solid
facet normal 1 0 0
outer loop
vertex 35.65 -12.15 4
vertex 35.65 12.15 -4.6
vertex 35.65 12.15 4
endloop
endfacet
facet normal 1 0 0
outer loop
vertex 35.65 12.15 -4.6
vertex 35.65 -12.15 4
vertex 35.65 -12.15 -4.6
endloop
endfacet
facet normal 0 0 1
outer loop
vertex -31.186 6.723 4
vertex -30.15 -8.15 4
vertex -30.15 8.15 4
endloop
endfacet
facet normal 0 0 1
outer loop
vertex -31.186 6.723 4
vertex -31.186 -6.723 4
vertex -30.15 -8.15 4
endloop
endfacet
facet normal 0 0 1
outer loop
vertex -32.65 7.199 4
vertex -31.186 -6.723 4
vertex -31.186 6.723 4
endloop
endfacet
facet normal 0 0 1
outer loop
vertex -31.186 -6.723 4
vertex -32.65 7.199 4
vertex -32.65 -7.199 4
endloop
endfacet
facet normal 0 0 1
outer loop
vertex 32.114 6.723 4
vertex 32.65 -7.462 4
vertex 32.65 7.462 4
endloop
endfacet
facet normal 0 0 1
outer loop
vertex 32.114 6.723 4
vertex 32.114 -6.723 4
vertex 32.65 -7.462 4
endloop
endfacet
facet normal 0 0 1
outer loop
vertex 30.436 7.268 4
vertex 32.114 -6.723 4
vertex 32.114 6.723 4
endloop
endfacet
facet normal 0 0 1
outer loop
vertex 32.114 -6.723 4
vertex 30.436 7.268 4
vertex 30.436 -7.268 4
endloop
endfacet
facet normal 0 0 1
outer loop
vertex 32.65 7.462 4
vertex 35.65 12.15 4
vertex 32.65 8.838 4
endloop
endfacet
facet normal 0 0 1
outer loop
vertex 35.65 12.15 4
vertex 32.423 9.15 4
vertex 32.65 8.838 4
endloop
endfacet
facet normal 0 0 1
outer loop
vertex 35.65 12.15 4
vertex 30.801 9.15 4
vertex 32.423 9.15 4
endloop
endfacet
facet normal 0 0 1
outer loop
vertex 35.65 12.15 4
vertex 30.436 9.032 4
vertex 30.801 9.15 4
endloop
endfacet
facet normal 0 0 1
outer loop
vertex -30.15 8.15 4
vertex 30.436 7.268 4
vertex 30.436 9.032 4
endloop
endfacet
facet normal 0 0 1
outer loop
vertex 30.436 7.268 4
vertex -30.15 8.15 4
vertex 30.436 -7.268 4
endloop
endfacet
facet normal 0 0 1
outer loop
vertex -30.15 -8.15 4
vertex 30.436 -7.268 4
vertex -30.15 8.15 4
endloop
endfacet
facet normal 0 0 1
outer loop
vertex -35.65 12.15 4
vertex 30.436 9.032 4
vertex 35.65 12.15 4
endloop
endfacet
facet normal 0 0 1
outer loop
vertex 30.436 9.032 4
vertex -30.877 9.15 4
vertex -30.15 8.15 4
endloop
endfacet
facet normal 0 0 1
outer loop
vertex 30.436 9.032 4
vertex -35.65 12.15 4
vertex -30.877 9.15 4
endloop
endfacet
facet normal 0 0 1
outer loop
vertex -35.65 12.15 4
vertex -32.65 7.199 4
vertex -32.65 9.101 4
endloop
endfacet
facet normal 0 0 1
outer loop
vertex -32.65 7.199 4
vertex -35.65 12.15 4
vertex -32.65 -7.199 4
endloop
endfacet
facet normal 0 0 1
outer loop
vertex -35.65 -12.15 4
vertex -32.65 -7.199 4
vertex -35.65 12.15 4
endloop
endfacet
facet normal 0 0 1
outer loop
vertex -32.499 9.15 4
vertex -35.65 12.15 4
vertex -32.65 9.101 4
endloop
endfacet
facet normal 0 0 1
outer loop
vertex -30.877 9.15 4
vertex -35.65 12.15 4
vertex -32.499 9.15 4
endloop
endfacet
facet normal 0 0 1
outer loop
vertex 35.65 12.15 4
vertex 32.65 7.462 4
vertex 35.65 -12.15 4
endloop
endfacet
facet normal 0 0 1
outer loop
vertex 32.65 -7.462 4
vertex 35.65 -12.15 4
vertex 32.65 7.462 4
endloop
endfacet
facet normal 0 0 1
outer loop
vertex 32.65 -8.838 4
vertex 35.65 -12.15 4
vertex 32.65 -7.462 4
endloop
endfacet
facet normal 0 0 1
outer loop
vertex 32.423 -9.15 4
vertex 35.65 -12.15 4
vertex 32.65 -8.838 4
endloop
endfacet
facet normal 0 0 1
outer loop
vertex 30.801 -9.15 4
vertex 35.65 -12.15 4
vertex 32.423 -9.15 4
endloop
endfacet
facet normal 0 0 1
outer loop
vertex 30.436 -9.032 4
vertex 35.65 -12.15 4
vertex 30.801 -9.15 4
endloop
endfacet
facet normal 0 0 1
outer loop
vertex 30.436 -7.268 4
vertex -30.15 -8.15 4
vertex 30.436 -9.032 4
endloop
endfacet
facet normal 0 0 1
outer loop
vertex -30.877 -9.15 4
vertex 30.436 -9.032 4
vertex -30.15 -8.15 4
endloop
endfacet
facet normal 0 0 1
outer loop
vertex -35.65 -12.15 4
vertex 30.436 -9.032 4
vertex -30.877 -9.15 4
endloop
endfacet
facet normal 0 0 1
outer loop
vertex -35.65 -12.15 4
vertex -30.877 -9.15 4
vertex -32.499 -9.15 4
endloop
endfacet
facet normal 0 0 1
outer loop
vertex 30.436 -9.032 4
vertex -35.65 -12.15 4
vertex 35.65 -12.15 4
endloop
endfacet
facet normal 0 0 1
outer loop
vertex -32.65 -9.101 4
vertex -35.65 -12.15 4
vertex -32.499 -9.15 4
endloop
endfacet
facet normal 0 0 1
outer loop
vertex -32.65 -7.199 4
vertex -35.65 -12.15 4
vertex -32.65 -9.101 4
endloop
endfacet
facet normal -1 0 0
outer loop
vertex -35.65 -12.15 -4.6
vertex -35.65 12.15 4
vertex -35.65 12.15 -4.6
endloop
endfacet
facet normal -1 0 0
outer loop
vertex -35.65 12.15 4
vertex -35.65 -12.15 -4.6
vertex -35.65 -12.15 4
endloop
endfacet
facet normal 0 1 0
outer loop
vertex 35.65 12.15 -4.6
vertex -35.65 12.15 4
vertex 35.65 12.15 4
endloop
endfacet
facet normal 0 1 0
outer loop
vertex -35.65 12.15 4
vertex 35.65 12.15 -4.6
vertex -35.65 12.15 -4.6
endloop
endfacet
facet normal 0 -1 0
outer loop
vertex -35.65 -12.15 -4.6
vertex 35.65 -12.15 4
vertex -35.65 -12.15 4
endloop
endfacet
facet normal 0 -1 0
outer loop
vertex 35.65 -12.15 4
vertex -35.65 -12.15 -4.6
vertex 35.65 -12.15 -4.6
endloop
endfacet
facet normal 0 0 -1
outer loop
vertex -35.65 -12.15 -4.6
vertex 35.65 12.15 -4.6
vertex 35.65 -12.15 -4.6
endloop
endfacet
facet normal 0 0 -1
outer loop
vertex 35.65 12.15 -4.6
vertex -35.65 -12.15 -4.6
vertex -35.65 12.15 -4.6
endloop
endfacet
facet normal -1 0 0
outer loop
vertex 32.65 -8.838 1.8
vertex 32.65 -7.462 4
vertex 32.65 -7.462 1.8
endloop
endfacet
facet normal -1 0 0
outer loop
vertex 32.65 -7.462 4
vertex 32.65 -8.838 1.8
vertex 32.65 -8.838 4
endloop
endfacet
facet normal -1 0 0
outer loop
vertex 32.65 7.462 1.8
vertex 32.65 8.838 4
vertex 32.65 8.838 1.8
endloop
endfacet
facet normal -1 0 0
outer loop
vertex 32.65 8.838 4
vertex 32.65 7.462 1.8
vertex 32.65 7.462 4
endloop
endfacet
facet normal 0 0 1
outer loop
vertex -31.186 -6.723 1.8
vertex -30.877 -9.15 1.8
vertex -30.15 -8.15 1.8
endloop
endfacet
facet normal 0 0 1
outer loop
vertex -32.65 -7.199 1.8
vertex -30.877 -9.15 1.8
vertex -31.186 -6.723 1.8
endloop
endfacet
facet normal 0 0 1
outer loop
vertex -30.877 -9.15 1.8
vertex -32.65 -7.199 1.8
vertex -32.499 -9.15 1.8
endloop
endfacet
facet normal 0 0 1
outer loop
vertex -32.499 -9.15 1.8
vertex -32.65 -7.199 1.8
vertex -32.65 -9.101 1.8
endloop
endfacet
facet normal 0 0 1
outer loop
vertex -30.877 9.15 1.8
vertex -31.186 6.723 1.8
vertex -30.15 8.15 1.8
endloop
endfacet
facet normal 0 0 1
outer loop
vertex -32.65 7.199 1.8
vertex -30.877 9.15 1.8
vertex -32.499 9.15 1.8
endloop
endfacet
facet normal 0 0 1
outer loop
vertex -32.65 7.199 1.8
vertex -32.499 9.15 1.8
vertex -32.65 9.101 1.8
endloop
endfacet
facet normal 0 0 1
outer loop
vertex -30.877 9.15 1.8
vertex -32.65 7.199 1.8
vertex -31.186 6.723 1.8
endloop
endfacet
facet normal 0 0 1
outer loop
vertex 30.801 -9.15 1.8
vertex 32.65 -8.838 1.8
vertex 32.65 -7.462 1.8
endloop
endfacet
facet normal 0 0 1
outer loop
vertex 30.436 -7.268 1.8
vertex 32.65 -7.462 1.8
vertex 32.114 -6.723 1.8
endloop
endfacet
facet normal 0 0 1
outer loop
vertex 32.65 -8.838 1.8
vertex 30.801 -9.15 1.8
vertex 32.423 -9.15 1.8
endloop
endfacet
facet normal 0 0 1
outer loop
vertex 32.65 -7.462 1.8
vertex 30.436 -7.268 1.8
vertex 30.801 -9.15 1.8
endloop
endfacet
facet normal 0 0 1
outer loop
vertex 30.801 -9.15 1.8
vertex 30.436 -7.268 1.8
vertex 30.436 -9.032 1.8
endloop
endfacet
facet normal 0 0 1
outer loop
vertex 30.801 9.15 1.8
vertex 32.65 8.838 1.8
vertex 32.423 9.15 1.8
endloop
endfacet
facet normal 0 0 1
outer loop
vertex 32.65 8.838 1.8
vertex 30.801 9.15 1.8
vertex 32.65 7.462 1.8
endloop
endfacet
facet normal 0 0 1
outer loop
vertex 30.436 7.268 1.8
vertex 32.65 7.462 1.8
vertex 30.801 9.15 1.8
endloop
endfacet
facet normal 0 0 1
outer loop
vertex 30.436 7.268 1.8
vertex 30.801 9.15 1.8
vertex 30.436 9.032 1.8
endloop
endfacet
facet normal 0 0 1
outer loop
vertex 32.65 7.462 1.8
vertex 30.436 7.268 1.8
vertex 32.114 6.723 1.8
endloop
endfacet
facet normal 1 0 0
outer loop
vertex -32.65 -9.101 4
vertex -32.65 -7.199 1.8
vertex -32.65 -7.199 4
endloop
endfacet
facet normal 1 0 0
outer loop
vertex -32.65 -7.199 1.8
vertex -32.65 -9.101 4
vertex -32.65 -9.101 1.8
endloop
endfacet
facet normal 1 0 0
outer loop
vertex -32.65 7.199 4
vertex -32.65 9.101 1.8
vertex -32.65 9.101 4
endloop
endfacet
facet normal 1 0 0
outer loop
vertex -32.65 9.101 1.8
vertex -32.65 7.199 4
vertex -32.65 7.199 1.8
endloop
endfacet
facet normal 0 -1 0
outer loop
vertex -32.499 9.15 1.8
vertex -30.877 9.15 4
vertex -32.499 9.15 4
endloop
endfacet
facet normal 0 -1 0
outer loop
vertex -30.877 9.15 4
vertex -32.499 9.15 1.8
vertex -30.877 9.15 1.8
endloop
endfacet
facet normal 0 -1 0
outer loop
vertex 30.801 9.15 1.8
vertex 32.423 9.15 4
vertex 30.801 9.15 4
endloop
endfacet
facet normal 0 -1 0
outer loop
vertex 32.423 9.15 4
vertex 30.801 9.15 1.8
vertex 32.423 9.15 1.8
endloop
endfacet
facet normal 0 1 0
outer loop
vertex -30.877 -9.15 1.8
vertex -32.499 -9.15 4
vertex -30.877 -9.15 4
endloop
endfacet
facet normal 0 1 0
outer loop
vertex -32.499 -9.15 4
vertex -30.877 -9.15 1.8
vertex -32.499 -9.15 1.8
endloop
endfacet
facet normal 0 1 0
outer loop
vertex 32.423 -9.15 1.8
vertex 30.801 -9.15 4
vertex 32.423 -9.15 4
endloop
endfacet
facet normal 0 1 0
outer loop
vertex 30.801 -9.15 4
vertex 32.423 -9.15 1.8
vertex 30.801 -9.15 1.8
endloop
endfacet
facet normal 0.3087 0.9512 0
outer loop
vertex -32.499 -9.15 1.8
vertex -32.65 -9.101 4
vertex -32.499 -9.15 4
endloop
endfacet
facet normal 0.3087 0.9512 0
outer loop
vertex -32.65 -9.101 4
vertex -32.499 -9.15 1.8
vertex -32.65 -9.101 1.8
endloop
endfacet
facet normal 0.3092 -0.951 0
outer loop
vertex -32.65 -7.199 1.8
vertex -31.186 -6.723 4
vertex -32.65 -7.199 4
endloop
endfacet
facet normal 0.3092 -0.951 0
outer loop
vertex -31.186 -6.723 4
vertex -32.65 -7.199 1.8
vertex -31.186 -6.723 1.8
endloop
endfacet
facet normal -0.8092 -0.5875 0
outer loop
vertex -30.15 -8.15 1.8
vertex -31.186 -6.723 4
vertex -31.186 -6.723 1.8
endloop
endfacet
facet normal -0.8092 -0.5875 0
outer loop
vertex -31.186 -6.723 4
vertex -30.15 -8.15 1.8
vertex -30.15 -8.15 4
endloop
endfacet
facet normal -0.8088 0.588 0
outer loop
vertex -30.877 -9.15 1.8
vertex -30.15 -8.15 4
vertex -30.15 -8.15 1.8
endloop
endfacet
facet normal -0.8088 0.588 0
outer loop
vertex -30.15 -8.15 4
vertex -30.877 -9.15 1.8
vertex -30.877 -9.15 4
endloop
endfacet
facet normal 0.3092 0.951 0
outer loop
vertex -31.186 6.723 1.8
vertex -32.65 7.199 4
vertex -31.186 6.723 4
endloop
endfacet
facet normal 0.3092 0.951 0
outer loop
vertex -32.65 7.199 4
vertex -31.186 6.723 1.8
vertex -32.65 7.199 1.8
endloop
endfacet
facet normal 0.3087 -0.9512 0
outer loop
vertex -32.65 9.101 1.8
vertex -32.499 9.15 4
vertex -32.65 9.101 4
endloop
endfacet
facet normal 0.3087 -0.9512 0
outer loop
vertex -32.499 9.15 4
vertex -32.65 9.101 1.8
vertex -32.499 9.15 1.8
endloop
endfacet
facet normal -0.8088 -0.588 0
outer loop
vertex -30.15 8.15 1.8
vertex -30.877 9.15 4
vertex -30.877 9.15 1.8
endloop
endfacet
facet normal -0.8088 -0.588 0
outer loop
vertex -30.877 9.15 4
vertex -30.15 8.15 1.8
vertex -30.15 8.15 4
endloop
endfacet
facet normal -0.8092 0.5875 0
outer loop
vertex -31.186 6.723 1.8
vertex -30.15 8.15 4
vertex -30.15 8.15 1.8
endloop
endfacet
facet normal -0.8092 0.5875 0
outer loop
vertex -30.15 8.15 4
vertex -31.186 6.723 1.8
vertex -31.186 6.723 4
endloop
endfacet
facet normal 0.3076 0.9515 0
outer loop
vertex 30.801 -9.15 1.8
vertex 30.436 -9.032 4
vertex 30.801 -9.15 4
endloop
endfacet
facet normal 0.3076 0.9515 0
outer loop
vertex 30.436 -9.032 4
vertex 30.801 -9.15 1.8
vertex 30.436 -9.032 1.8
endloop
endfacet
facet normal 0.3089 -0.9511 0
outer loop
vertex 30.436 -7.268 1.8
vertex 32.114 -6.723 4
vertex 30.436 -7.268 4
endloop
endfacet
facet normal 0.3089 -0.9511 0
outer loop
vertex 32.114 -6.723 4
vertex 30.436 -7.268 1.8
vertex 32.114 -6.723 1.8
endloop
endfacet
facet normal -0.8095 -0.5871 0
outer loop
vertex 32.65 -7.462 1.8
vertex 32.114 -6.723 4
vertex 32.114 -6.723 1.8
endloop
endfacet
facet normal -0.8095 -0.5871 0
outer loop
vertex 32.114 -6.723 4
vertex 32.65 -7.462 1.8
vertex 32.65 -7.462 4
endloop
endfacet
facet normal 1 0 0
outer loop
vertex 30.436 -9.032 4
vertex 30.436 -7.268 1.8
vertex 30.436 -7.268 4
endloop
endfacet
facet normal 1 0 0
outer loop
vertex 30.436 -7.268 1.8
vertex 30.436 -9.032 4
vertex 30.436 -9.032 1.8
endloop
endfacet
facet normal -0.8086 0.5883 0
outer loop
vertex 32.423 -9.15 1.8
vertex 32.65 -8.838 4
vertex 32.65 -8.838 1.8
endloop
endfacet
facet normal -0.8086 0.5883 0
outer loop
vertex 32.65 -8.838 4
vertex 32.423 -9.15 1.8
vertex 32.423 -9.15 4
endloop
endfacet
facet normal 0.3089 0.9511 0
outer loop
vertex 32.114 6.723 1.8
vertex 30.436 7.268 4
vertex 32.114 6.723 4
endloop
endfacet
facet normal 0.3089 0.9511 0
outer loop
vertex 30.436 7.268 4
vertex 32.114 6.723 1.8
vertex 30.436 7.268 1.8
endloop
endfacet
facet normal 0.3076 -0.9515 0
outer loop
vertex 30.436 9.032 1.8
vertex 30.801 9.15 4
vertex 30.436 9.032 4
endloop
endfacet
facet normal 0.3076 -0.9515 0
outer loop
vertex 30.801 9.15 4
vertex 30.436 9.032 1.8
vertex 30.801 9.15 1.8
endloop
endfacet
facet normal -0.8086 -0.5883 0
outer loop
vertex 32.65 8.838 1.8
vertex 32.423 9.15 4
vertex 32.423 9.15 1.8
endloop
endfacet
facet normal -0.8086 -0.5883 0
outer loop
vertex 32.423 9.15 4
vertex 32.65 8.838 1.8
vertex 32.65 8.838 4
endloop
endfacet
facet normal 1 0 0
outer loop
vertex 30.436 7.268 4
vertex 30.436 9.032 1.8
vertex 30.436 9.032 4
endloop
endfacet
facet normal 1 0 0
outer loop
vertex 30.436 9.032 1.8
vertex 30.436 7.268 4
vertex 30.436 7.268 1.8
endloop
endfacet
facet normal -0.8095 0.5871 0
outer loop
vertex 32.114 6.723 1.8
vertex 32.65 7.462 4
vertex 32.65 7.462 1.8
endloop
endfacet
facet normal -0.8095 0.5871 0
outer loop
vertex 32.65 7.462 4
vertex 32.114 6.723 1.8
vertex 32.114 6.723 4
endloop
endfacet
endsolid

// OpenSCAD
// Parameters
width_mm = 71.3; //[35.65:142.6:0.1]
height_mm = 24.3; //[12.15:48.6:0.1]
thickness_mm = 8.0; //[4.0:16.0:0.1]
pcb_thickness_mm = 1.6; //[0.8:3.2:0.1]
aperture_enabled = 1; //[0:1:1]
aperture_margin_mm = 3.0; //[1.5:6.0:0.1]
mounting_holes_enabled = 1; //[0:1:1]
mounting_hole_diameter_mm = 3.0; //[1.5:6.0:0.1]
corner_radius_mm = 0.5; //[0.25:1.0:0.05]
overlap_mm = 1.0; //[0.5:2.0:0.1]
aperture_depth_mm = 2.0; //[0.8:4.0:0.1]
aperture_extra_mm = 0.2; //[0.1:1.0:0.1]
hole_edge_margin_mm = 2.5; //[1.5:5.0:0.1]

// Display module - complete geometry
module display() {
  color([0.0, 0.4, 0.2]) { // PCB green
    // Main body
    cube([width_mm, height_mm, thickness_mm], center=true);
    
    // PCB plate
    translate([0, 0, -thickness_mm/2 - pcb_thickness_mm/2 + overlap_mm])
      cube([width_mm, height_mm, pcb_thickness_mm], center=true);
  }
}

// Mod - complete geometry
module mod() {
  color([0.0, 0.4, 0.2]) { // PCB green
    // Viewing aperture cutout
    if (aperture_enabled) {
      difference() {
        display();
        translate([0, 0, thickness_mm/2 - (aperture_depth_mm + aperture_extra_mm)/2])
          cube([width_mm - 2*aperture_margin_mm, height_mm - 2*aperture_margin_mm, aperture_depth_mm + aperture_extra_mm], center=true);
      }
    } else {
      display();
    }
    
    // Mounting holes
    if (mounting_holes_enabled) {
      difference() {
        display();
        for (x = [-1, 1], y = [-1, 1]) {
          translate([x * (width_mm/2 - hole_edge_margin_mm - mounting_hole_diameter_mm/2),
                     y * (height_mm/2 - hole_edge_margin_mm - mounting_hole_diameter_mm/2),
                     -pcb_thickness_mm/2 + overlap_mm])
            cylinder(h=pcb_thickness_mm + thickness_mm + 2*overlap_mm, r=mounting_hole_diameter_mm/2, center=true);
        }
      }
    }
  }
}

// Assembly
module assembly() {
  mod();
}

assembly();
